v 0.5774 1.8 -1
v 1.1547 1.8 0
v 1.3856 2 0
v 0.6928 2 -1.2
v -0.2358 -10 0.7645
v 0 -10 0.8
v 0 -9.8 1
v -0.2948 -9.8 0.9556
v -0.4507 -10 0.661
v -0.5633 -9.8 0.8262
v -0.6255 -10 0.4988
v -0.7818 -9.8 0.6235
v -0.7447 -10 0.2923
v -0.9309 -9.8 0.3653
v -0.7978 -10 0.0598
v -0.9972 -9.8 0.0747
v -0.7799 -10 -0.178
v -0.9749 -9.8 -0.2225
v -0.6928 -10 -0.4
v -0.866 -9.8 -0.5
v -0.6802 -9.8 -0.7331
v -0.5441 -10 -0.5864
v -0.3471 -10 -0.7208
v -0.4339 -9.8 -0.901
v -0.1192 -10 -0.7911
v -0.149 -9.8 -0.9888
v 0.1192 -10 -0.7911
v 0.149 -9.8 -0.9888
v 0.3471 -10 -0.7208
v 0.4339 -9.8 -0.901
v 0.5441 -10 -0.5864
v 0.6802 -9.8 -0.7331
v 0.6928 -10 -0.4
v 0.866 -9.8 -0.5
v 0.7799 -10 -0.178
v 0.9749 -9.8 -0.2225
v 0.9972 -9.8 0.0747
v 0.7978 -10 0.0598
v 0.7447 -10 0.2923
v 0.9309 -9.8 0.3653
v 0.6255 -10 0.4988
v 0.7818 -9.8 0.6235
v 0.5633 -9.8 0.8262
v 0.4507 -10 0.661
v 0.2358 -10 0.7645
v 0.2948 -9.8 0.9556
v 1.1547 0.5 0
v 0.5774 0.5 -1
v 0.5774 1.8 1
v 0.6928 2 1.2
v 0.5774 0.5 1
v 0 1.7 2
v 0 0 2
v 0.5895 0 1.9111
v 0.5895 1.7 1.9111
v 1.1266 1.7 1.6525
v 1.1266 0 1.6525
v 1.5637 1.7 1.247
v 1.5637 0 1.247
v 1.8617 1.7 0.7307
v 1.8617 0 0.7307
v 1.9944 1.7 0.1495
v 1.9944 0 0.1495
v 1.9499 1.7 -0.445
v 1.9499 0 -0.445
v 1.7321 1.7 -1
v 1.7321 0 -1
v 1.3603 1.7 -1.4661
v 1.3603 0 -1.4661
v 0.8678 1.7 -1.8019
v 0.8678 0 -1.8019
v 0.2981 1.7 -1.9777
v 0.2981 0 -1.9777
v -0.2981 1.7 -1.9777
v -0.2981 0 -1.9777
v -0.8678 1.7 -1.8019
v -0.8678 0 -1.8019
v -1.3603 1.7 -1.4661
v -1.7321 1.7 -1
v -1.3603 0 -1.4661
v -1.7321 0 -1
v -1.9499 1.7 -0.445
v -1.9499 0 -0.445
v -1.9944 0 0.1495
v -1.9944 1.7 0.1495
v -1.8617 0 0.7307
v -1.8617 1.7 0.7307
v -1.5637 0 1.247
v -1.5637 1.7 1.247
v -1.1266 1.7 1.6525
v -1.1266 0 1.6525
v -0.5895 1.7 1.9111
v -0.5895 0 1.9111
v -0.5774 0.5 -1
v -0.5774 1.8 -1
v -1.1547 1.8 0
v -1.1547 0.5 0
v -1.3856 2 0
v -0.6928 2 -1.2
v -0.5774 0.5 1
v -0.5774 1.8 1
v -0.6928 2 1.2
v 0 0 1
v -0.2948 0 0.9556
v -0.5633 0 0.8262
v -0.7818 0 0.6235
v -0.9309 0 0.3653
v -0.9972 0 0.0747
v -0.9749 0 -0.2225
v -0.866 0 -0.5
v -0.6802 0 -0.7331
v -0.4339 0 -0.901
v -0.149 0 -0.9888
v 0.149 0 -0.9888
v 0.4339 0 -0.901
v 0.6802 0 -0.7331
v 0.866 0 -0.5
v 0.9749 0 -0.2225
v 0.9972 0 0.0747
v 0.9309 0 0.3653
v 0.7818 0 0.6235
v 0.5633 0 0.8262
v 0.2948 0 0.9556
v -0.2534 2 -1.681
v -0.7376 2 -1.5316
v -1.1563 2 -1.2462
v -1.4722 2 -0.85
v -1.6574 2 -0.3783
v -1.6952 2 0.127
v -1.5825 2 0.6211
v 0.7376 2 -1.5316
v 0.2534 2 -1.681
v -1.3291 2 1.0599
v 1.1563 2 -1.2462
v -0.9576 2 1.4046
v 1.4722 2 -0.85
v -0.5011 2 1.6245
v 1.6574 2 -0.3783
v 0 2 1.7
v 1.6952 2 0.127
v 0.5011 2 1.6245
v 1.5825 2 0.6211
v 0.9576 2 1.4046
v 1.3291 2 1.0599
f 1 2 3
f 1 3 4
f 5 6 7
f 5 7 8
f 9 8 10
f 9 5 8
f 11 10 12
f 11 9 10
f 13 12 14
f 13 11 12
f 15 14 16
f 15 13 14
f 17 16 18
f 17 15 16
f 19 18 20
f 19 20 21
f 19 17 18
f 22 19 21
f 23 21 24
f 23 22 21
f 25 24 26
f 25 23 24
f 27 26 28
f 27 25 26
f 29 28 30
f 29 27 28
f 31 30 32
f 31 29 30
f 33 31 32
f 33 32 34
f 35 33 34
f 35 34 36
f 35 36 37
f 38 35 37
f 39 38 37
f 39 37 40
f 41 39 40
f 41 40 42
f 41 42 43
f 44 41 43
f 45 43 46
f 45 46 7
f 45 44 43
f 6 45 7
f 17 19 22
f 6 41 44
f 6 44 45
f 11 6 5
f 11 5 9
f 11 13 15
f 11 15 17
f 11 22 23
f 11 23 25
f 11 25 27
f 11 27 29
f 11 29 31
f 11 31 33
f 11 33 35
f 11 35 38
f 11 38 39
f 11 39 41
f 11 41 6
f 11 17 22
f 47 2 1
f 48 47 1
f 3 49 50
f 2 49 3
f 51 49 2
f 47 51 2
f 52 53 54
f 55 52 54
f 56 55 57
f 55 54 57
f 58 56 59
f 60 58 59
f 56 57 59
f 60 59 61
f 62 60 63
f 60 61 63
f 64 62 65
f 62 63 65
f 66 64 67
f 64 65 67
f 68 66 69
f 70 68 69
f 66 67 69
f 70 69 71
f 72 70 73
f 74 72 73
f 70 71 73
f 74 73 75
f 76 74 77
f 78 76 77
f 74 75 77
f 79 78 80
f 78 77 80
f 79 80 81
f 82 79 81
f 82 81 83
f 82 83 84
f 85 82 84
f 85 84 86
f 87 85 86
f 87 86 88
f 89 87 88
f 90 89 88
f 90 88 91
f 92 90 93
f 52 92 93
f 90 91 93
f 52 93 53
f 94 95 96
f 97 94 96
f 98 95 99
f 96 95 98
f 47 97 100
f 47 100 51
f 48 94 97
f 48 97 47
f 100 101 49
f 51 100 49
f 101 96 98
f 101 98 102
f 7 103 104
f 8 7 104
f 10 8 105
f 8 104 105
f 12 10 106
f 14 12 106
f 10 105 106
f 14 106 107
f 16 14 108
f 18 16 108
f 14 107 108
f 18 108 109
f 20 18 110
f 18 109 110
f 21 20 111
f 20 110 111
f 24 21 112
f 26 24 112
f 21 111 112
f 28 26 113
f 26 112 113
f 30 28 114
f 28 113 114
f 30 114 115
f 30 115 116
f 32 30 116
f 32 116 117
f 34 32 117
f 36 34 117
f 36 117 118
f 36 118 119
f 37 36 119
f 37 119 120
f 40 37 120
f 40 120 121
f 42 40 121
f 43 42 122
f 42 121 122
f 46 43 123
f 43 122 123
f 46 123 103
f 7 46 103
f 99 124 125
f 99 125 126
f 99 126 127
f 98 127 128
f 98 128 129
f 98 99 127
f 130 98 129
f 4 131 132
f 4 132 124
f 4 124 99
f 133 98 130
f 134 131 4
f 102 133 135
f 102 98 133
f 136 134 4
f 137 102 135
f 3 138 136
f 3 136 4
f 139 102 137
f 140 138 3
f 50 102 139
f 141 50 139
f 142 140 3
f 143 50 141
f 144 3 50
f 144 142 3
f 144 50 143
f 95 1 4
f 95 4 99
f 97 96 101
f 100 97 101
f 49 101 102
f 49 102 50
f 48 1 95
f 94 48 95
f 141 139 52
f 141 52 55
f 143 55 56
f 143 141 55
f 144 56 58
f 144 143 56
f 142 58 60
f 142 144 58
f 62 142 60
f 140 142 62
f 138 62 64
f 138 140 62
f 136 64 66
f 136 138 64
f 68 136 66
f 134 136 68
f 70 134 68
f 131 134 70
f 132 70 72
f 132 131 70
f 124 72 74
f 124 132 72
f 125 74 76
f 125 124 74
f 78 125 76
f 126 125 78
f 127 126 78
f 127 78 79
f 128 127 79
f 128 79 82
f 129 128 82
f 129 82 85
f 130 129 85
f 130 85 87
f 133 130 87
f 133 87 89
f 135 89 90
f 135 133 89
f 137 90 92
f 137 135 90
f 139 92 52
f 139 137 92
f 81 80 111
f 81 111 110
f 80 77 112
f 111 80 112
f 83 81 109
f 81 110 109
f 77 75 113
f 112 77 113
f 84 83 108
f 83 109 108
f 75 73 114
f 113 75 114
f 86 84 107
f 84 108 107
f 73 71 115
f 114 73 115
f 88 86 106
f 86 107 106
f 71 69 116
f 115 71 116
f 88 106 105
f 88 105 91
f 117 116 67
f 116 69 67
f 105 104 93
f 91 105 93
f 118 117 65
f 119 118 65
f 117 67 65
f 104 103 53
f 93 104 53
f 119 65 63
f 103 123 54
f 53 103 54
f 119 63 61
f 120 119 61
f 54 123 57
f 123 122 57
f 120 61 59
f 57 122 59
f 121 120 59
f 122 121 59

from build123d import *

# Parameters (mm, degrees)
SKETCH1_R           = 2
BOSS_EXTRUDE1_DEPTH = 2
CHAMFER1_SIZE       = 0.3
CUT_EXTRUDE1_DEPTH  = 1.5
CHAMFER2_SIZE       = 0.2
SKETCH3_R           = 1
BOSS_EXTRUDE2_DEPTH = 10
CHAMFER3_SIZE       = 0.2


with BuildPart() as part:
    # Sketch1 → Boss-Extrude1 (new body)
    with BuildSketch(Plane(origin=(0, 0, 0), x_dir=(1, 0, 0), z_dir=(0, 1, 0))):
        with Locations(Location((0, 0, 0), (0, 0, 270))):  # turned: the seam where the file's is
            Circle(SKETCH1_R)
    extrude(amount=BOSS_EXTRUDE1_DEPTH)

    # Chamfer1
    chamfer1_edges = [part.edges().sort_by_distance(p)[0] for p in [
        (0, 2, -2),
    ]]
    chamfer(chamfer1_edges, length=CHAMFER1_SIZE)

    # Sketch2 → Cut-Extrude1 (cut)
    with BuildSketch(Plane(origin=(0, 2, 0), x_dir=(1, 0, 0), z_dir=(0, 1, 0))):
        Polygon((1.154700538, 0), (0.577350269, 1), (-0.577350269, 1), (-1.154700538, 0), (-0.577350269, -1), (0.577350269, -1), align=None)
    extrude(amount=-CUT_EXTRUDE1_DEPTH, mode=Mode.SUBTRACT)

    # Chamfer2
    chamfer2_edges = [part.edges().sort_by_distance(p)[0] for p in [
        (0.866025404, 2, 0.5),
        (0.866025404, 2, -0.5),
        (0, 2, -1),
        (-0.866025404, 2, -0.5),
        (-0.866025404, 2, 0.5),
        (0, 2, 1),
    ]]
    chamfer(chamfer2_edges, length=CHAMFER2_SIZE)

    # Sketch3 → Boss-Extrude2 (add)
    with BuildSketch(Plane.XZ):
        with Locations(Location((0, 0, 0), (0, 0, 90))):  # turned: the seam where the file's is
            Circle(SKETCH3_R)
    extrude(amount=BOSS_EXTRUDE2_DEPTH)

    # Chamfer3
    chamfer3_edges = [part.edges().sort_by_distance(p)[0] for p in [
        (0, -10, -1),
    ]]
    chamfer(chamfer3_edges, length=CHAMFER3_SIZE)


solid = part.part
